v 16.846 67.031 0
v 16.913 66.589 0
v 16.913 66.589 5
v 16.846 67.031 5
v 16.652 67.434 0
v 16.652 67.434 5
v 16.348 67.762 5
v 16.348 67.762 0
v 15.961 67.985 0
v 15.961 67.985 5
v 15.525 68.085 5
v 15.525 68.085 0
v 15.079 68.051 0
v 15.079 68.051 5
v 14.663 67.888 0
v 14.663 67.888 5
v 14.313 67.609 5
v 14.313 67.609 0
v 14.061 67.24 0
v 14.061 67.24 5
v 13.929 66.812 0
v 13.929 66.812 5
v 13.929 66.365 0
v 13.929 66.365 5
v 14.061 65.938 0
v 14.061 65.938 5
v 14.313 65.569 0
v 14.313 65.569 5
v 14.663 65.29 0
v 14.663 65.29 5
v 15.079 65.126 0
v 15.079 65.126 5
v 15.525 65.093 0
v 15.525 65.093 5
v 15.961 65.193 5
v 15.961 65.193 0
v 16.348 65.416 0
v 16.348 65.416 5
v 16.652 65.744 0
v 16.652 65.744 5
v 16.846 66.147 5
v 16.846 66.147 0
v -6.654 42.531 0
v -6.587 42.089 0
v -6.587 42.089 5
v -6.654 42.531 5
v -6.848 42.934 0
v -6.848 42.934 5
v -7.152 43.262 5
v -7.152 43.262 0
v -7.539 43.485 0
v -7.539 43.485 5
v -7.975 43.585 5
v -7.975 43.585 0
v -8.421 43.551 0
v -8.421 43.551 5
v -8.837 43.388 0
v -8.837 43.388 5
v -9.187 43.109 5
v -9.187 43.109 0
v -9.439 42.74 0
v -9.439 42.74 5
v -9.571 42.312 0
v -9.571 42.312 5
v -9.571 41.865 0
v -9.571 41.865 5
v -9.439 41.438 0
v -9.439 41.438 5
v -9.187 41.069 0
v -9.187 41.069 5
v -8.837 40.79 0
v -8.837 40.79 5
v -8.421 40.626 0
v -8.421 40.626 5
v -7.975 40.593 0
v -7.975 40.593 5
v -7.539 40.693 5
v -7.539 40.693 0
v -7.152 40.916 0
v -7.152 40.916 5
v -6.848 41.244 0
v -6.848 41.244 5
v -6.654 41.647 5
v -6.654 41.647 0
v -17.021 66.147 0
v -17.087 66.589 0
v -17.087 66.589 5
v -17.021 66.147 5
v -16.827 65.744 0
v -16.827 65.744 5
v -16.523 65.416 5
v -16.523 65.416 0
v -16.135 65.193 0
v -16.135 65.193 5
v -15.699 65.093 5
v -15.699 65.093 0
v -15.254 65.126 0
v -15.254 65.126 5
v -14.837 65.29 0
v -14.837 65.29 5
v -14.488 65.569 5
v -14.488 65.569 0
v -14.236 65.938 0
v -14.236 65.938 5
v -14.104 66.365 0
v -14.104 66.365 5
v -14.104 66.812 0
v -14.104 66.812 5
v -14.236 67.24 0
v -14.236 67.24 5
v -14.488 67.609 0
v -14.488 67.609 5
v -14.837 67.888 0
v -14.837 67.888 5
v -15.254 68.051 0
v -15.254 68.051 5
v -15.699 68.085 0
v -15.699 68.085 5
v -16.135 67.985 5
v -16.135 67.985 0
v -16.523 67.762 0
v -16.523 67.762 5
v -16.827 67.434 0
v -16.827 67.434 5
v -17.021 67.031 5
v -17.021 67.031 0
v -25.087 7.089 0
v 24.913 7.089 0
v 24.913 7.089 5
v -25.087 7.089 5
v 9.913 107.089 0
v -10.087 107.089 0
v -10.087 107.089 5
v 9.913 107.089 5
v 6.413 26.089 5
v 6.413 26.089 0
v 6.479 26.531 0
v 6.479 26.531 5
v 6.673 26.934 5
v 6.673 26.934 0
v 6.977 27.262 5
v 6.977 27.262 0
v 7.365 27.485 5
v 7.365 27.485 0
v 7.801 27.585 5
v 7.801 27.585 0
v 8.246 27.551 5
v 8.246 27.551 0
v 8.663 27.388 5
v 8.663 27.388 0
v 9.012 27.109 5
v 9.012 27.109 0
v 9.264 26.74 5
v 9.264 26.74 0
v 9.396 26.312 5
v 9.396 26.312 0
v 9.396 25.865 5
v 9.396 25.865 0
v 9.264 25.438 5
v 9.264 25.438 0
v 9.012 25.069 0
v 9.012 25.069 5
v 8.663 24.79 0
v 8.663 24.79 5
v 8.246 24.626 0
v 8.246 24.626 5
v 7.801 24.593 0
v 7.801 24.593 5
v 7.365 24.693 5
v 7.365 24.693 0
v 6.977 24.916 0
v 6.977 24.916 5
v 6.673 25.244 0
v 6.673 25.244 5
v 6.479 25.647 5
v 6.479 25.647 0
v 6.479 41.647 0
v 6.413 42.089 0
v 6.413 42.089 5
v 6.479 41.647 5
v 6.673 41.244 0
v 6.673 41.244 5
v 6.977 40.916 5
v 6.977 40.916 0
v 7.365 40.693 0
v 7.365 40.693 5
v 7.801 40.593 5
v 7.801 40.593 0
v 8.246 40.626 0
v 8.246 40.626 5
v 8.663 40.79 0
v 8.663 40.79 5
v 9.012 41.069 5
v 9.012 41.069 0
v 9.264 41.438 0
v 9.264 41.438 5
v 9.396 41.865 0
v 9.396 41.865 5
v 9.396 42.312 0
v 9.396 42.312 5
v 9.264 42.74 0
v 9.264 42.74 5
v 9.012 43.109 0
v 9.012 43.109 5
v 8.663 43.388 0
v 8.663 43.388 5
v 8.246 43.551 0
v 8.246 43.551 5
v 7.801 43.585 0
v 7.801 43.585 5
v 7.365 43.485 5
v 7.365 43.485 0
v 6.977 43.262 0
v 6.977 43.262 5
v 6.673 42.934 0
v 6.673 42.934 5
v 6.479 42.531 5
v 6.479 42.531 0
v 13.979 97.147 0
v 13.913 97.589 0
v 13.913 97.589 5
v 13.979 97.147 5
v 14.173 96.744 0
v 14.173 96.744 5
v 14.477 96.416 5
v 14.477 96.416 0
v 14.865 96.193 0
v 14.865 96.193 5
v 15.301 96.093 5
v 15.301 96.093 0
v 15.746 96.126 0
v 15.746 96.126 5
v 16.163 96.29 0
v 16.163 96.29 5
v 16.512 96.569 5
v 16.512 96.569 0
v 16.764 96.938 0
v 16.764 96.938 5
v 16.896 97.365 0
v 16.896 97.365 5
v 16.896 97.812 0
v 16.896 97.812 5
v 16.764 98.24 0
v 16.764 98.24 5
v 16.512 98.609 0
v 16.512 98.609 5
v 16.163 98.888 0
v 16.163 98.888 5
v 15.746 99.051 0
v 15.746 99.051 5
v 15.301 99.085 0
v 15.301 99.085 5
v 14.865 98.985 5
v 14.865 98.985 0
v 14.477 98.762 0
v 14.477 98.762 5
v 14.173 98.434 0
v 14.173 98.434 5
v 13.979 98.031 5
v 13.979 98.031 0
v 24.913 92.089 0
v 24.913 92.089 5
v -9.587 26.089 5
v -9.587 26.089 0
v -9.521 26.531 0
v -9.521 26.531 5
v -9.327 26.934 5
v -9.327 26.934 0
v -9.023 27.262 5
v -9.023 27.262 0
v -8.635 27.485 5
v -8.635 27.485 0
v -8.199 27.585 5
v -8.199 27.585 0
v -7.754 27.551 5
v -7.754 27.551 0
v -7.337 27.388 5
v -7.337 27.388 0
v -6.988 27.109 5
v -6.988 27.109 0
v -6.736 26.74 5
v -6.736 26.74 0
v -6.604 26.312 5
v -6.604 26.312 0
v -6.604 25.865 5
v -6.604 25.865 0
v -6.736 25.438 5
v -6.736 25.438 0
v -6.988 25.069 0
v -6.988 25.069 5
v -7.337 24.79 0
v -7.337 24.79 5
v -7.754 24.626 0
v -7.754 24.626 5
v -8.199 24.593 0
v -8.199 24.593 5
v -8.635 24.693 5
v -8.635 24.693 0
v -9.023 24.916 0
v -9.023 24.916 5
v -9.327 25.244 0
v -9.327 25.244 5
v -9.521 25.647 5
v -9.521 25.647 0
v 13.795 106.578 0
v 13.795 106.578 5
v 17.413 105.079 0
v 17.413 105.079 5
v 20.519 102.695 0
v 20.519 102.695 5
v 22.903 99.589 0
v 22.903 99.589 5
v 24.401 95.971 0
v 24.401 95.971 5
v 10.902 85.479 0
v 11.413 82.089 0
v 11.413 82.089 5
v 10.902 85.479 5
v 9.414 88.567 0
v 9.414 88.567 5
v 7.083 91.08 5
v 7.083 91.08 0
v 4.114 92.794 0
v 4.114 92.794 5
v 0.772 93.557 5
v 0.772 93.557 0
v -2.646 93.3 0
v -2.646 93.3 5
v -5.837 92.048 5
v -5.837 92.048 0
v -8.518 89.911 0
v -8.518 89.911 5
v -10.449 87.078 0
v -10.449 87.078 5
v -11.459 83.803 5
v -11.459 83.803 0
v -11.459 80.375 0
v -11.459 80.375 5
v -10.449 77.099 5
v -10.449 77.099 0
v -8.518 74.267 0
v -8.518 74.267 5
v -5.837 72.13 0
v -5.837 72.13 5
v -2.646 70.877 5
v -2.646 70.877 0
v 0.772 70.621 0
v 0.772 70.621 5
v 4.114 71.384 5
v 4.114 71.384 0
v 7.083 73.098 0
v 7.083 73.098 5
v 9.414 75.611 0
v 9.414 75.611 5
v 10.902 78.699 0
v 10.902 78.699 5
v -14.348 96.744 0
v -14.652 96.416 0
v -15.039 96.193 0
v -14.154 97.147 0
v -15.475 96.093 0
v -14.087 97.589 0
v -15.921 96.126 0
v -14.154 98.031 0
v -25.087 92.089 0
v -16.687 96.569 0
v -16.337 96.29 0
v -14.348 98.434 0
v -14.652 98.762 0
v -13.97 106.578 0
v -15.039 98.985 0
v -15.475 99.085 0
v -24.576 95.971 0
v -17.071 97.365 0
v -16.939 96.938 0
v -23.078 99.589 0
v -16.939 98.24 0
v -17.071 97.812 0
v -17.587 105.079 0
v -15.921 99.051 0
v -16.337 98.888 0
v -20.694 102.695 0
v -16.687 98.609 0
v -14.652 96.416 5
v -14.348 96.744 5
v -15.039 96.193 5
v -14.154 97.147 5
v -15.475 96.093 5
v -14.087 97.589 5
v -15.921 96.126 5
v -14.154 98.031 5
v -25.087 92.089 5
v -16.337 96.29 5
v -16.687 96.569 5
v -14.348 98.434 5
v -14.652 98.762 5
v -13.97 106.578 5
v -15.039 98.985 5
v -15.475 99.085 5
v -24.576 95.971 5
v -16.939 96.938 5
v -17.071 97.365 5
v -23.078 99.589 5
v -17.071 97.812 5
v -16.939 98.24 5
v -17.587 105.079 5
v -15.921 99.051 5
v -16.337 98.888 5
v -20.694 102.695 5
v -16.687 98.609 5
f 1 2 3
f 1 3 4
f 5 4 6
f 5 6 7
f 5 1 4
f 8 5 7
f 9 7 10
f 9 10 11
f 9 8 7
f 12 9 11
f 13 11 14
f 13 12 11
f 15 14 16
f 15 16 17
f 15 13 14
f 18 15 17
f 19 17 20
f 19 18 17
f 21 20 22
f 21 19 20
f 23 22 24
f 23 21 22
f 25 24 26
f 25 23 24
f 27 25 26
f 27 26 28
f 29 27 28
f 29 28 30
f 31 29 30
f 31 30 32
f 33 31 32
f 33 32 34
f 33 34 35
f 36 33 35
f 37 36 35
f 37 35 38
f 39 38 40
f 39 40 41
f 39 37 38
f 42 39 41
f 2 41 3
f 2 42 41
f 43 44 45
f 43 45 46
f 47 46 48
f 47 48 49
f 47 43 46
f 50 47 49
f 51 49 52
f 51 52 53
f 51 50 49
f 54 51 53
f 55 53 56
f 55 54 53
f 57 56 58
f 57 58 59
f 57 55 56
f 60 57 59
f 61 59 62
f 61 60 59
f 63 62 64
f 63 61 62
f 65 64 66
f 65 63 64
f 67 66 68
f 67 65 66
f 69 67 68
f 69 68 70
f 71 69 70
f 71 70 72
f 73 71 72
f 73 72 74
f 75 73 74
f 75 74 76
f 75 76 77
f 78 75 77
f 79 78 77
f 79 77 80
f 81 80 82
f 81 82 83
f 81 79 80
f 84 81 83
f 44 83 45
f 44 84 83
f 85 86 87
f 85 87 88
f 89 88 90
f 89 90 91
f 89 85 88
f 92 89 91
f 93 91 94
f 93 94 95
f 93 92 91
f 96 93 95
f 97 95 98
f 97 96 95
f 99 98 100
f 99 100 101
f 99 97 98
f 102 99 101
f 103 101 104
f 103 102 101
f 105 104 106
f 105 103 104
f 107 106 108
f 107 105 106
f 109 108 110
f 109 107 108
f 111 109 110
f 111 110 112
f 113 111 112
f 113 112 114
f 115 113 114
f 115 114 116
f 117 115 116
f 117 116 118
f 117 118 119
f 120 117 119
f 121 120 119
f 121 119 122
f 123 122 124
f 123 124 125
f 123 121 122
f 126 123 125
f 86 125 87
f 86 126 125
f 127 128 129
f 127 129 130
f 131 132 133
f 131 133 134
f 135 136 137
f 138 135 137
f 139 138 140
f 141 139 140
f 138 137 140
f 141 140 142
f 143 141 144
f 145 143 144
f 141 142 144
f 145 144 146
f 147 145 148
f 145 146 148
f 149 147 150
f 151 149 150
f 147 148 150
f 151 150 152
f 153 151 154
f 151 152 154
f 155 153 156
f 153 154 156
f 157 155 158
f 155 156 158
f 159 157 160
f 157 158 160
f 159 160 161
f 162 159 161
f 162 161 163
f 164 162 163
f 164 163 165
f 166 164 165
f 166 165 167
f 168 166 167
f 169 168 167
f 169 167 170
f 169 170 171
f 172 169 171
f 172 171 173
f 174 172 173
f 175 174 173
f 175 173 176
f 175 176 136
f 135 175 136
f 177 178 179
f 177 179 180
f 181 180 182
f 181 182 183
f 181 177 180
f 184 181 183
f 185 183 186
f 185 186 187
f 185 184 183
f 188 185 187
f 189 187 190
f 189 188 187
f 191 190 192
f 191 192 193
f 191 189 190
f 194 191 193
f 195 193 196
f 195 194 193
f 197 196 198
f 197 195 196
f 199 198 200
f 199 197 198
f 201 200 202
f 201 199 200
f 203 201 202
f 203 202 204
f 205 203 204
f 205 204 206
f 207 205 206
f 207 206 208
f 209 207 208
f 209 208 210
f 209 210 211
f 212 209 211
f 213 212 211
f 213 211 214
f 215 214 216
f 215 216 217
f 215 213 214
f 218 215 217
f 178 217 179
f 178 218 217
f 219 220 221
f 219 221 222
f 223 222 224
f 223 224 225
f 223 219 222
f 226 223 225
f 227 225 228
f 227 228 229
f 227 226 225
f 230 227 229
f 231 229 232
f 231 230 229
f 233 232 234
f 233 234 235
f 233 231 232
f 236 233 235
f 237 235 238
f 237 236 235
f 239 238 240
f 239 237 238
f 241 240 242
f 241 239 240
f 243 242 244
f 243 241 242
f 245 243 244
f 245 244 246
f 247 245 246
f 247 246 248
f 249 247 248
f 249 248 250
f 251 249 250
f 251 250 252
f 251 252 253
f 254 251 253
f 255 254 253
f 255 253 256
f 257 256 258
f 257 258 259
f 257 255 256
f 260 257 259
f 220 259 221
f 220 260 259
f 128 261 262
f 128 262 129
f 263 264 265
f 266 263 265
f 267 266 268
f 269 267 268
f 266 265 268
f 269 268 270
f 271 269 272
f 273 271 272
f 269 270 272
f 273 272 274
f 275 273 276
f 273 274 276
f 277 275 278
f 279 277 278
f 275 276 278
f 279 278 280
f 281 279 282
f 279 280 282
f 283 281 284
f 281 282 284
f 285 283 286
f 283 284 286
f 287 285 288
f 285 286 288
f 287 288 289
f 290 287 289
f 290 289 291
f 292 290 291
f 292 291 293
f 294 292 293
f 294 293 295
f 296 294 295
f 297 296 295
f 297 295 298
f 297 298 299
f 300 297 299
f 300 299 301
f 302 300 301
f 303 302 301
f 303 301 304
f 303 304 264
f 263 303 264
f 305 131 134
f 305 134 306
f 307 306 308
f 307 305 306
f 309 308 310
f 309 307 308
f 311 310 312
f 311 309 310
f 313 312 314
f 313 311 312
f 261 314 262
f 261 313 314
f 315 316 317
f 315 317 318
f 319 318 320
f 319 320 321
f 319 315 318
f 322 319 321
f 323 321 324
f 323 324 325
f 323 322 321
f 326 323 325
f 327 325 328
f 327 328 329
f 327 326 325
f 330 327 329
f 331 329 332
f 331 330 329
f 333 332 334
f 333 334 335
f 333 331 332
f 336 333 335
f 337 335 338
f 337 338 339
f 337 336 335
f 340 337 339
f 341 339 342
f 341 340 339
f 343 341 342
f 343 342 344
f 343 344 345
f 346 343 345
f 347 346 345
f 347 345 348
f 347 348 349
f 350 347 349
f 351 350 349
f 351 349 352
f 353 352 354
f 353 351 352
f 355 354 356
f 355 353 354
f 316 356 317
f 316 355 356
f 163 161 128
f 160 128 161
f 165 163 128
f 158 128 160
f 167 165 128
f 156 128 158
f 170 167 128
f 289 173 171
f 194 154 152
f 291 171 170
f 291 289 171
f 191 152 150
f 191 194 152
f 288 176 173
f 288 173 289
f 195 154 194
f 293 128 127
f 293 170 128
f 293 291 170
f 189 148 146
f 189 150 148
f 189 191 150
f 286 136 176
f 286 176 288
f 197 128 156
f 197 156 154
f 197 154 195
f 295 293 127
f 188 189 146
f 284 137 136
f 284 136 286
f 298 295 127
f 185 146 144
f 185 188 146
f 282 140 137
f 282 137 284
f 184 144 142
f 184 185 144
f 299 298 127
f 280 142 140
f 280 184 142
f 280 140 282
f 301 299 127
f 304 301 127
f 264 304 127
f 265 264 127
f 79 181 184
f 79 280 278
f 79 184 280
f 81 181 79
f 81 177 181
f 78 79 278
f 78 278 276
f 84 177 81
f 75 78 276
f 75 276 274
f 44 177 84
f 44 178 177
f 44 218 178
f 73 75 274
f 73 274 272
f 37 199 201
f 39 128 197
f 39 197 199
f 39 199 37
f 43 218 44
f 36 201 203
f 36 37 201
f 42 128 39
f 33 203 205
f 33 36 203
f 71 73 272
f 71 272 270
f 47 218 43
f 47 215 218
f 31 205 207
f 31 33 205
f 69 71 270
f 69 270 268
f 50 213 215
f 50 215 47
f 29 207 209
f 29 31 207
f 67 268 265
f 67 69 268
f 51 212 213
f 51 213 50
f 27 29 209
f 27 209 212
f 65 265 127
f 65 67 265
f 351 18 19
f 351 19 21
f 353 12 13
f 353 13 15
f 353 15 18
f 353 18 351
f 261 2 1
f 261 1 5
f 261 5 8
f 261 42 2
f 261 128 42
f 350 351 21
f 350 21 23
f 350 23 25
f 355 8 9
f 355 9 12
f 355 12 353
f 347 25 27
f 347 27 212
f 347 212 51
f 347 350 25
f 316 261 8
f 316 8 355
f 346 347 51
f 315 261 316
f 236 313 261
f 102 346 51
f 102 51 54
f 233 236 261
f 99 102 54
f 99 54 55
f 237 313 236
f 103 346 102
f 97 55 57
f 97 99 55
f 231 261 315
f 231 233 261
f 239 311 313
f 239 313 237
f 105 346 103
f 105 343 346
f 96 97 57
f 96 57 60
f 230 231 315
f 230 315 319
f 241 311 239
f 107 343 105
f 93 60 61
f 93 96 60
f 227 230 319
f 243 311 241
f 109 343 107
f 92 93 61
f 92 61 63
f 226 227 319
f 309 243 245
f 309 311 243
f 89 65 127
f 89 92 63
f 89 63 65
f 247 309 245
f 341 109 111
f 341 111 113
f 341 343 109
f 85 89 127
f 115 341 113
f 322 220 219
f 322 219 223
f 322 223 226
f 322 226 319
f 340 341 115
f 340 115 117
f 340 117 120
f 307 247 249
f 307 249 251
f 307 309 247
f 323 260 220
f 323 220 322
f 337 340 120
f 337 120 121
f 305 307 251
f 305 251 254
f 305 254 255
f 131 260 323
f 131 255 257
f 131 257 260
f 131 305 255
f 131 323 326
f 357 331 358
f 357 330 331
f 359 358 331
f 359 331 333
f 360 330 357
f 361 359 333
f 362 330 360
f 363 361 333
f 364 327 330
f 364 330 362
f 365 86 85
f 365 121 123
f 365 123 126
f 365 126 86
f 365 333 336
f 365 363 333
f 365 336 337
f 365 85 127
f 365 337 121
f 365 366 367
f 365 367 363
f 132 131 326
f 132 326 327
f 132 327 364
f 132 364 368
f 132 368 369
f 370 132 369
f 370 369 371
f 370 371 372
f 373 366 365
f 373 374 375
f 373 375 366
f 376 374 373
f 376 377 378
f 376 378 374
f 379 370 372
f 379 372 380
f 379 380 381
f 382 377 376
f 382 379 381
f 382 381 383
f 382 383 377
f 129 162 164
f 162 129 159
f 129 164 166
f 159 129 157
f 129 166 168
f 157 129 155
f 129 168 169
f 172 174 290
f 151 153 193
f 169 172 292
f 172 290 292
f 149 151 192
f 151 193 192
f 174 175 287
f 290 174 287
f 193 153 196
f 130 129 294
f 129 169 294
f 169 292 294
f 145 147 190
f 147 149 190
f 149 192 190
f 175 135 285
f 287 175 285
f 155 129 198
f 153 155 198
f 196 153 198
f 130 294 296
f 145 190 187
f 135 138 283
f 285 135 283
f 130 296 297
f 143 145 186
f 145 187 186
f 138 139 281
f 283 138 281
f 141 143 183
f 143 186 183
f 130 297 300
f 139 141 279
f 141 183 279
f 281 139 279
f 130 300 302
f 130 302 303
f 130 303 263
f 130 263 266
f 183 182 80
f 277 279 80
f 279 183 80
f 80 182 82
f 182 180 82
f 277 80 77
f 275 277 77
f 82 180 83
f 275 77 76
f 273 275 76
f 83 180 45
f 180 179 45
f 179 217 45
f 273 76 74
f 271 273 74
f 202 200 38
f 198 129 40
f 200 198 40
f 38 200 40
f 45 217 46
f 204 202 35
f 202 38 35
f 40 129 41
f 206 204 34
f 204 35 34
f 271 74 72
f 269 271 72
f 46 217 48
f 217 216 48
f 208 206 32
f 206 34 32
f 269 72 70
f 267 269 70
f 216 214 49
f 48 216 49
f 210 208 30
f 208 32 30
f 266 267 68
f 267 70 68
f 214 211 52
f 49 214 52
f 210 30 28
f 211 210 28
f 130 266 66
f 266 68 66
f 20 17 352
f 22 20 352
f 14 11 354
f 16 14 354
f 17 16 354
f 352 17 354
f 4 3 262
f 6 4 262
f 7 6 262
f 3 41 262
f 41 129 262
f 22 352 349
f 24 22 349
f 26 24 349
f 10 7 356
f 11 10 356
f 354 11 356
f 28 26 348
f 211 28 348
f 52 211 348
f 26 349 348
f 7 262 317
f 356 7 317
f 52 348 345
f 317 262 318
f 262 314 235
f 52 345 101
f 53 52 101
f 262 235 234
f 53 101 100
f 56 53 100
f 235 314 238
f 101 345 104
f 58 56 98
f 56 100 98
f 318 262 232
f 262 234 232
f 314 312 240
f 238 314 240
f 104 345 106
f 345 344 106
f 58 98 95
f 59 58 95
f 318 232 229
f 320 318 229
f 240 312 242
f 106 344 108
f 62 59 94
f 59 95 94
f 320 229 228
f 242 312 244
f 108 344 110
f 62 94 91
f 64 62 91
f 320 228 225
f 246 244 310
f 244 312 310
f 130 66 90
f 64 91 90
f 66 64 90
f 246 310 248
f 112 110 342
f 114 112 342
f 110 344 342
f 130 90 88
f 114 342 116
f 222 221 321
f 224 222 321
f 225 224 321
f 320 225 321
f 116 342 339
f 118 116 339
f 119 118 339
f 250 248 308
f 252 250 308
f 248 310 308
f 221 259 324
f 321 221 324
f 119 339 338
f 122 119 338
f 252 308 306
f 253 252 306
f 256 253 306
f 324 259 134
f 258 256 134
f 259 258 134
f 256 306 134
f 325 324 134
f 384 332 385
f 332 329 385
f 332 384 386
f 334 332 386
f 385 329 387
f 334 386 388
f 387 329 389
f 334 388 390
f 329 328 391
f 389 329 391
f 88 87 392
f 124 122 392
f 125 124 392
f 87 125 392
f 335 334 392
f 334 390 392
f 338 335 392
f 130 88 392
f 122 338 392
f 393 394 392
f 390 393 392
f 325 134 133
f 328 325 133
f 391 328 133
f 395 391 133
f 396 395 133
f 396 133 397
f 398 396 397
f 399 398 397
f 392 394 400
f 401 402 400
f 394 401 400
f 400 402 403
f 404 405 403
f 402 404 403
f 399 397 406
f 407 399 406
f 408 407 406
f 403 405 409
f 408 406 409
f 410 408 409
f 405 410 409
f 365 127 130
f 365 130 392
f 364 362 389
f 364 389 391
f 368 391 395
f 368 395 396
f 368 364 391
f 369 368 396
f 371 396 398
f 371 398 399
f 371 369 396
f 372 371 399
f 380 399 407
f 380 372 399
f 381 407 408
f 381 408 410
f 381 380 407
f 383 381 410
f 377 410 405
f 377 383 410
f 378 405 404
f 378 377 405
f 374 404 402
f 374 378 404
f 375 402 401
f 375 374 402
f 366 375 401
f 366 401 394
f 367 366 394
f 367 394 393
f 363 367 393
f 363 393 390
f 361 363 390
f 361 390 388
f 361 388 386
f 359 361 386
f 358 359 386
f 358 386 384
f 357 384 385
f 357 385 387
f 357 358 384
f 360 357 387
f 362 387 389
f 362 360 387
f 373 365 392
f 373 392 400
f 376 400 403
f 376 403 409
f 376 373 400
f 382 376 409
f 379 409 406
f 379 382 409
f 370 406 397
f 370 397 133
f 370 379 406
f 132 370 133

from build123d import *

# Parameters (mm, degrees)
SKETCH4_R           = 11.5
SKETCH4_R_2         = 1.5
BOSS_EXTRUDE1_DEPTH = 5
SKETCH5_R           = 1.5
CUT_EXTRUDE1_DEPTH  = 111.101739948


with BuildPart() as part:
    # Sketch4 → Boss-Extrude1 (new body)
    with BuildSketch(Plane.XY):
        with BuildLine():
            Line((-10.087403903, 107.088819702), (9.912596097, 107.088819702))
            ThreePointArc((9.912596097, 107.088819702), (20.519197815, 102.695421419), (24.912596097, 92.088819702))
            Line((24.912596097, 92.088819702), (24.912596097, 7.088819702))
            Line((24.912596097, 7.088819702), (-25.087403903, 7.088819702))
            Line((-25.087403903, 7.088819702), (-25.087403903, 92.088819702))
            ThreePointArc((-25.087403903, 92.088819702), (-20.694005621, 102.695421419), (-10.087403903, 107.088819702))
        make_face()
        with Locations((-0.087403903, 82.088819702)):
            Circle(SKETCH4_R, mode=Mode.SUBTRACT)
        with Locations((15.412596097, 66.588819702)):
            Circle(SKETCH4_R_2, mode=Mode.SUBTRACT)
        with Locations(Location((-15.587403903, 66.588819702, 0), (0, 0, 180))):
            Circle(SKETCH4_R_2, mode=Mode.SUBTRACT)
        with Locations(Location((15.412596097, 97.588819702, 0), (0, 0, 180))):
            Circle(SKETCH4_R_2, mode=Mode.SUBTRACT)
        with Locations((-15.587403903, 97.588819702)):
            Circle(SKETCH4_R_2, mode=Mode.SUBTRACT)
        with Locations((-8.087403903, 42.088819702)):
            Circle(SKETCH4_R_2, mode=Mode.SUBTRACT)
        with Locations(Location((7.912596097, 42.088819702, 0), (0, 0, 180))):
            Circle(SKETCH4_R_2, mode=Mode.SUBTRACT)
    extrude(amount=BOSS_EXTRUDE1_DEPTH)

    # Sketch5 → Cut-Extrude1 (cut, through all)
    with BuildSketch(Plane(origin=(0, 0, 0), x_dir=(-1, 0, 0), z_dir=(0, 0, -1))):
        with Locations((8.087403903, 26.088819702)):
            Circle(SKETCH5_R)
        with Locations((-7.912596097, 26.088819702)):
            Circle(SKETCH5_R)
    extrude(amount=-CUT_EXTRUDE1_DEPTH, mode=Mode.SUBTRACT)


solid = part.part
